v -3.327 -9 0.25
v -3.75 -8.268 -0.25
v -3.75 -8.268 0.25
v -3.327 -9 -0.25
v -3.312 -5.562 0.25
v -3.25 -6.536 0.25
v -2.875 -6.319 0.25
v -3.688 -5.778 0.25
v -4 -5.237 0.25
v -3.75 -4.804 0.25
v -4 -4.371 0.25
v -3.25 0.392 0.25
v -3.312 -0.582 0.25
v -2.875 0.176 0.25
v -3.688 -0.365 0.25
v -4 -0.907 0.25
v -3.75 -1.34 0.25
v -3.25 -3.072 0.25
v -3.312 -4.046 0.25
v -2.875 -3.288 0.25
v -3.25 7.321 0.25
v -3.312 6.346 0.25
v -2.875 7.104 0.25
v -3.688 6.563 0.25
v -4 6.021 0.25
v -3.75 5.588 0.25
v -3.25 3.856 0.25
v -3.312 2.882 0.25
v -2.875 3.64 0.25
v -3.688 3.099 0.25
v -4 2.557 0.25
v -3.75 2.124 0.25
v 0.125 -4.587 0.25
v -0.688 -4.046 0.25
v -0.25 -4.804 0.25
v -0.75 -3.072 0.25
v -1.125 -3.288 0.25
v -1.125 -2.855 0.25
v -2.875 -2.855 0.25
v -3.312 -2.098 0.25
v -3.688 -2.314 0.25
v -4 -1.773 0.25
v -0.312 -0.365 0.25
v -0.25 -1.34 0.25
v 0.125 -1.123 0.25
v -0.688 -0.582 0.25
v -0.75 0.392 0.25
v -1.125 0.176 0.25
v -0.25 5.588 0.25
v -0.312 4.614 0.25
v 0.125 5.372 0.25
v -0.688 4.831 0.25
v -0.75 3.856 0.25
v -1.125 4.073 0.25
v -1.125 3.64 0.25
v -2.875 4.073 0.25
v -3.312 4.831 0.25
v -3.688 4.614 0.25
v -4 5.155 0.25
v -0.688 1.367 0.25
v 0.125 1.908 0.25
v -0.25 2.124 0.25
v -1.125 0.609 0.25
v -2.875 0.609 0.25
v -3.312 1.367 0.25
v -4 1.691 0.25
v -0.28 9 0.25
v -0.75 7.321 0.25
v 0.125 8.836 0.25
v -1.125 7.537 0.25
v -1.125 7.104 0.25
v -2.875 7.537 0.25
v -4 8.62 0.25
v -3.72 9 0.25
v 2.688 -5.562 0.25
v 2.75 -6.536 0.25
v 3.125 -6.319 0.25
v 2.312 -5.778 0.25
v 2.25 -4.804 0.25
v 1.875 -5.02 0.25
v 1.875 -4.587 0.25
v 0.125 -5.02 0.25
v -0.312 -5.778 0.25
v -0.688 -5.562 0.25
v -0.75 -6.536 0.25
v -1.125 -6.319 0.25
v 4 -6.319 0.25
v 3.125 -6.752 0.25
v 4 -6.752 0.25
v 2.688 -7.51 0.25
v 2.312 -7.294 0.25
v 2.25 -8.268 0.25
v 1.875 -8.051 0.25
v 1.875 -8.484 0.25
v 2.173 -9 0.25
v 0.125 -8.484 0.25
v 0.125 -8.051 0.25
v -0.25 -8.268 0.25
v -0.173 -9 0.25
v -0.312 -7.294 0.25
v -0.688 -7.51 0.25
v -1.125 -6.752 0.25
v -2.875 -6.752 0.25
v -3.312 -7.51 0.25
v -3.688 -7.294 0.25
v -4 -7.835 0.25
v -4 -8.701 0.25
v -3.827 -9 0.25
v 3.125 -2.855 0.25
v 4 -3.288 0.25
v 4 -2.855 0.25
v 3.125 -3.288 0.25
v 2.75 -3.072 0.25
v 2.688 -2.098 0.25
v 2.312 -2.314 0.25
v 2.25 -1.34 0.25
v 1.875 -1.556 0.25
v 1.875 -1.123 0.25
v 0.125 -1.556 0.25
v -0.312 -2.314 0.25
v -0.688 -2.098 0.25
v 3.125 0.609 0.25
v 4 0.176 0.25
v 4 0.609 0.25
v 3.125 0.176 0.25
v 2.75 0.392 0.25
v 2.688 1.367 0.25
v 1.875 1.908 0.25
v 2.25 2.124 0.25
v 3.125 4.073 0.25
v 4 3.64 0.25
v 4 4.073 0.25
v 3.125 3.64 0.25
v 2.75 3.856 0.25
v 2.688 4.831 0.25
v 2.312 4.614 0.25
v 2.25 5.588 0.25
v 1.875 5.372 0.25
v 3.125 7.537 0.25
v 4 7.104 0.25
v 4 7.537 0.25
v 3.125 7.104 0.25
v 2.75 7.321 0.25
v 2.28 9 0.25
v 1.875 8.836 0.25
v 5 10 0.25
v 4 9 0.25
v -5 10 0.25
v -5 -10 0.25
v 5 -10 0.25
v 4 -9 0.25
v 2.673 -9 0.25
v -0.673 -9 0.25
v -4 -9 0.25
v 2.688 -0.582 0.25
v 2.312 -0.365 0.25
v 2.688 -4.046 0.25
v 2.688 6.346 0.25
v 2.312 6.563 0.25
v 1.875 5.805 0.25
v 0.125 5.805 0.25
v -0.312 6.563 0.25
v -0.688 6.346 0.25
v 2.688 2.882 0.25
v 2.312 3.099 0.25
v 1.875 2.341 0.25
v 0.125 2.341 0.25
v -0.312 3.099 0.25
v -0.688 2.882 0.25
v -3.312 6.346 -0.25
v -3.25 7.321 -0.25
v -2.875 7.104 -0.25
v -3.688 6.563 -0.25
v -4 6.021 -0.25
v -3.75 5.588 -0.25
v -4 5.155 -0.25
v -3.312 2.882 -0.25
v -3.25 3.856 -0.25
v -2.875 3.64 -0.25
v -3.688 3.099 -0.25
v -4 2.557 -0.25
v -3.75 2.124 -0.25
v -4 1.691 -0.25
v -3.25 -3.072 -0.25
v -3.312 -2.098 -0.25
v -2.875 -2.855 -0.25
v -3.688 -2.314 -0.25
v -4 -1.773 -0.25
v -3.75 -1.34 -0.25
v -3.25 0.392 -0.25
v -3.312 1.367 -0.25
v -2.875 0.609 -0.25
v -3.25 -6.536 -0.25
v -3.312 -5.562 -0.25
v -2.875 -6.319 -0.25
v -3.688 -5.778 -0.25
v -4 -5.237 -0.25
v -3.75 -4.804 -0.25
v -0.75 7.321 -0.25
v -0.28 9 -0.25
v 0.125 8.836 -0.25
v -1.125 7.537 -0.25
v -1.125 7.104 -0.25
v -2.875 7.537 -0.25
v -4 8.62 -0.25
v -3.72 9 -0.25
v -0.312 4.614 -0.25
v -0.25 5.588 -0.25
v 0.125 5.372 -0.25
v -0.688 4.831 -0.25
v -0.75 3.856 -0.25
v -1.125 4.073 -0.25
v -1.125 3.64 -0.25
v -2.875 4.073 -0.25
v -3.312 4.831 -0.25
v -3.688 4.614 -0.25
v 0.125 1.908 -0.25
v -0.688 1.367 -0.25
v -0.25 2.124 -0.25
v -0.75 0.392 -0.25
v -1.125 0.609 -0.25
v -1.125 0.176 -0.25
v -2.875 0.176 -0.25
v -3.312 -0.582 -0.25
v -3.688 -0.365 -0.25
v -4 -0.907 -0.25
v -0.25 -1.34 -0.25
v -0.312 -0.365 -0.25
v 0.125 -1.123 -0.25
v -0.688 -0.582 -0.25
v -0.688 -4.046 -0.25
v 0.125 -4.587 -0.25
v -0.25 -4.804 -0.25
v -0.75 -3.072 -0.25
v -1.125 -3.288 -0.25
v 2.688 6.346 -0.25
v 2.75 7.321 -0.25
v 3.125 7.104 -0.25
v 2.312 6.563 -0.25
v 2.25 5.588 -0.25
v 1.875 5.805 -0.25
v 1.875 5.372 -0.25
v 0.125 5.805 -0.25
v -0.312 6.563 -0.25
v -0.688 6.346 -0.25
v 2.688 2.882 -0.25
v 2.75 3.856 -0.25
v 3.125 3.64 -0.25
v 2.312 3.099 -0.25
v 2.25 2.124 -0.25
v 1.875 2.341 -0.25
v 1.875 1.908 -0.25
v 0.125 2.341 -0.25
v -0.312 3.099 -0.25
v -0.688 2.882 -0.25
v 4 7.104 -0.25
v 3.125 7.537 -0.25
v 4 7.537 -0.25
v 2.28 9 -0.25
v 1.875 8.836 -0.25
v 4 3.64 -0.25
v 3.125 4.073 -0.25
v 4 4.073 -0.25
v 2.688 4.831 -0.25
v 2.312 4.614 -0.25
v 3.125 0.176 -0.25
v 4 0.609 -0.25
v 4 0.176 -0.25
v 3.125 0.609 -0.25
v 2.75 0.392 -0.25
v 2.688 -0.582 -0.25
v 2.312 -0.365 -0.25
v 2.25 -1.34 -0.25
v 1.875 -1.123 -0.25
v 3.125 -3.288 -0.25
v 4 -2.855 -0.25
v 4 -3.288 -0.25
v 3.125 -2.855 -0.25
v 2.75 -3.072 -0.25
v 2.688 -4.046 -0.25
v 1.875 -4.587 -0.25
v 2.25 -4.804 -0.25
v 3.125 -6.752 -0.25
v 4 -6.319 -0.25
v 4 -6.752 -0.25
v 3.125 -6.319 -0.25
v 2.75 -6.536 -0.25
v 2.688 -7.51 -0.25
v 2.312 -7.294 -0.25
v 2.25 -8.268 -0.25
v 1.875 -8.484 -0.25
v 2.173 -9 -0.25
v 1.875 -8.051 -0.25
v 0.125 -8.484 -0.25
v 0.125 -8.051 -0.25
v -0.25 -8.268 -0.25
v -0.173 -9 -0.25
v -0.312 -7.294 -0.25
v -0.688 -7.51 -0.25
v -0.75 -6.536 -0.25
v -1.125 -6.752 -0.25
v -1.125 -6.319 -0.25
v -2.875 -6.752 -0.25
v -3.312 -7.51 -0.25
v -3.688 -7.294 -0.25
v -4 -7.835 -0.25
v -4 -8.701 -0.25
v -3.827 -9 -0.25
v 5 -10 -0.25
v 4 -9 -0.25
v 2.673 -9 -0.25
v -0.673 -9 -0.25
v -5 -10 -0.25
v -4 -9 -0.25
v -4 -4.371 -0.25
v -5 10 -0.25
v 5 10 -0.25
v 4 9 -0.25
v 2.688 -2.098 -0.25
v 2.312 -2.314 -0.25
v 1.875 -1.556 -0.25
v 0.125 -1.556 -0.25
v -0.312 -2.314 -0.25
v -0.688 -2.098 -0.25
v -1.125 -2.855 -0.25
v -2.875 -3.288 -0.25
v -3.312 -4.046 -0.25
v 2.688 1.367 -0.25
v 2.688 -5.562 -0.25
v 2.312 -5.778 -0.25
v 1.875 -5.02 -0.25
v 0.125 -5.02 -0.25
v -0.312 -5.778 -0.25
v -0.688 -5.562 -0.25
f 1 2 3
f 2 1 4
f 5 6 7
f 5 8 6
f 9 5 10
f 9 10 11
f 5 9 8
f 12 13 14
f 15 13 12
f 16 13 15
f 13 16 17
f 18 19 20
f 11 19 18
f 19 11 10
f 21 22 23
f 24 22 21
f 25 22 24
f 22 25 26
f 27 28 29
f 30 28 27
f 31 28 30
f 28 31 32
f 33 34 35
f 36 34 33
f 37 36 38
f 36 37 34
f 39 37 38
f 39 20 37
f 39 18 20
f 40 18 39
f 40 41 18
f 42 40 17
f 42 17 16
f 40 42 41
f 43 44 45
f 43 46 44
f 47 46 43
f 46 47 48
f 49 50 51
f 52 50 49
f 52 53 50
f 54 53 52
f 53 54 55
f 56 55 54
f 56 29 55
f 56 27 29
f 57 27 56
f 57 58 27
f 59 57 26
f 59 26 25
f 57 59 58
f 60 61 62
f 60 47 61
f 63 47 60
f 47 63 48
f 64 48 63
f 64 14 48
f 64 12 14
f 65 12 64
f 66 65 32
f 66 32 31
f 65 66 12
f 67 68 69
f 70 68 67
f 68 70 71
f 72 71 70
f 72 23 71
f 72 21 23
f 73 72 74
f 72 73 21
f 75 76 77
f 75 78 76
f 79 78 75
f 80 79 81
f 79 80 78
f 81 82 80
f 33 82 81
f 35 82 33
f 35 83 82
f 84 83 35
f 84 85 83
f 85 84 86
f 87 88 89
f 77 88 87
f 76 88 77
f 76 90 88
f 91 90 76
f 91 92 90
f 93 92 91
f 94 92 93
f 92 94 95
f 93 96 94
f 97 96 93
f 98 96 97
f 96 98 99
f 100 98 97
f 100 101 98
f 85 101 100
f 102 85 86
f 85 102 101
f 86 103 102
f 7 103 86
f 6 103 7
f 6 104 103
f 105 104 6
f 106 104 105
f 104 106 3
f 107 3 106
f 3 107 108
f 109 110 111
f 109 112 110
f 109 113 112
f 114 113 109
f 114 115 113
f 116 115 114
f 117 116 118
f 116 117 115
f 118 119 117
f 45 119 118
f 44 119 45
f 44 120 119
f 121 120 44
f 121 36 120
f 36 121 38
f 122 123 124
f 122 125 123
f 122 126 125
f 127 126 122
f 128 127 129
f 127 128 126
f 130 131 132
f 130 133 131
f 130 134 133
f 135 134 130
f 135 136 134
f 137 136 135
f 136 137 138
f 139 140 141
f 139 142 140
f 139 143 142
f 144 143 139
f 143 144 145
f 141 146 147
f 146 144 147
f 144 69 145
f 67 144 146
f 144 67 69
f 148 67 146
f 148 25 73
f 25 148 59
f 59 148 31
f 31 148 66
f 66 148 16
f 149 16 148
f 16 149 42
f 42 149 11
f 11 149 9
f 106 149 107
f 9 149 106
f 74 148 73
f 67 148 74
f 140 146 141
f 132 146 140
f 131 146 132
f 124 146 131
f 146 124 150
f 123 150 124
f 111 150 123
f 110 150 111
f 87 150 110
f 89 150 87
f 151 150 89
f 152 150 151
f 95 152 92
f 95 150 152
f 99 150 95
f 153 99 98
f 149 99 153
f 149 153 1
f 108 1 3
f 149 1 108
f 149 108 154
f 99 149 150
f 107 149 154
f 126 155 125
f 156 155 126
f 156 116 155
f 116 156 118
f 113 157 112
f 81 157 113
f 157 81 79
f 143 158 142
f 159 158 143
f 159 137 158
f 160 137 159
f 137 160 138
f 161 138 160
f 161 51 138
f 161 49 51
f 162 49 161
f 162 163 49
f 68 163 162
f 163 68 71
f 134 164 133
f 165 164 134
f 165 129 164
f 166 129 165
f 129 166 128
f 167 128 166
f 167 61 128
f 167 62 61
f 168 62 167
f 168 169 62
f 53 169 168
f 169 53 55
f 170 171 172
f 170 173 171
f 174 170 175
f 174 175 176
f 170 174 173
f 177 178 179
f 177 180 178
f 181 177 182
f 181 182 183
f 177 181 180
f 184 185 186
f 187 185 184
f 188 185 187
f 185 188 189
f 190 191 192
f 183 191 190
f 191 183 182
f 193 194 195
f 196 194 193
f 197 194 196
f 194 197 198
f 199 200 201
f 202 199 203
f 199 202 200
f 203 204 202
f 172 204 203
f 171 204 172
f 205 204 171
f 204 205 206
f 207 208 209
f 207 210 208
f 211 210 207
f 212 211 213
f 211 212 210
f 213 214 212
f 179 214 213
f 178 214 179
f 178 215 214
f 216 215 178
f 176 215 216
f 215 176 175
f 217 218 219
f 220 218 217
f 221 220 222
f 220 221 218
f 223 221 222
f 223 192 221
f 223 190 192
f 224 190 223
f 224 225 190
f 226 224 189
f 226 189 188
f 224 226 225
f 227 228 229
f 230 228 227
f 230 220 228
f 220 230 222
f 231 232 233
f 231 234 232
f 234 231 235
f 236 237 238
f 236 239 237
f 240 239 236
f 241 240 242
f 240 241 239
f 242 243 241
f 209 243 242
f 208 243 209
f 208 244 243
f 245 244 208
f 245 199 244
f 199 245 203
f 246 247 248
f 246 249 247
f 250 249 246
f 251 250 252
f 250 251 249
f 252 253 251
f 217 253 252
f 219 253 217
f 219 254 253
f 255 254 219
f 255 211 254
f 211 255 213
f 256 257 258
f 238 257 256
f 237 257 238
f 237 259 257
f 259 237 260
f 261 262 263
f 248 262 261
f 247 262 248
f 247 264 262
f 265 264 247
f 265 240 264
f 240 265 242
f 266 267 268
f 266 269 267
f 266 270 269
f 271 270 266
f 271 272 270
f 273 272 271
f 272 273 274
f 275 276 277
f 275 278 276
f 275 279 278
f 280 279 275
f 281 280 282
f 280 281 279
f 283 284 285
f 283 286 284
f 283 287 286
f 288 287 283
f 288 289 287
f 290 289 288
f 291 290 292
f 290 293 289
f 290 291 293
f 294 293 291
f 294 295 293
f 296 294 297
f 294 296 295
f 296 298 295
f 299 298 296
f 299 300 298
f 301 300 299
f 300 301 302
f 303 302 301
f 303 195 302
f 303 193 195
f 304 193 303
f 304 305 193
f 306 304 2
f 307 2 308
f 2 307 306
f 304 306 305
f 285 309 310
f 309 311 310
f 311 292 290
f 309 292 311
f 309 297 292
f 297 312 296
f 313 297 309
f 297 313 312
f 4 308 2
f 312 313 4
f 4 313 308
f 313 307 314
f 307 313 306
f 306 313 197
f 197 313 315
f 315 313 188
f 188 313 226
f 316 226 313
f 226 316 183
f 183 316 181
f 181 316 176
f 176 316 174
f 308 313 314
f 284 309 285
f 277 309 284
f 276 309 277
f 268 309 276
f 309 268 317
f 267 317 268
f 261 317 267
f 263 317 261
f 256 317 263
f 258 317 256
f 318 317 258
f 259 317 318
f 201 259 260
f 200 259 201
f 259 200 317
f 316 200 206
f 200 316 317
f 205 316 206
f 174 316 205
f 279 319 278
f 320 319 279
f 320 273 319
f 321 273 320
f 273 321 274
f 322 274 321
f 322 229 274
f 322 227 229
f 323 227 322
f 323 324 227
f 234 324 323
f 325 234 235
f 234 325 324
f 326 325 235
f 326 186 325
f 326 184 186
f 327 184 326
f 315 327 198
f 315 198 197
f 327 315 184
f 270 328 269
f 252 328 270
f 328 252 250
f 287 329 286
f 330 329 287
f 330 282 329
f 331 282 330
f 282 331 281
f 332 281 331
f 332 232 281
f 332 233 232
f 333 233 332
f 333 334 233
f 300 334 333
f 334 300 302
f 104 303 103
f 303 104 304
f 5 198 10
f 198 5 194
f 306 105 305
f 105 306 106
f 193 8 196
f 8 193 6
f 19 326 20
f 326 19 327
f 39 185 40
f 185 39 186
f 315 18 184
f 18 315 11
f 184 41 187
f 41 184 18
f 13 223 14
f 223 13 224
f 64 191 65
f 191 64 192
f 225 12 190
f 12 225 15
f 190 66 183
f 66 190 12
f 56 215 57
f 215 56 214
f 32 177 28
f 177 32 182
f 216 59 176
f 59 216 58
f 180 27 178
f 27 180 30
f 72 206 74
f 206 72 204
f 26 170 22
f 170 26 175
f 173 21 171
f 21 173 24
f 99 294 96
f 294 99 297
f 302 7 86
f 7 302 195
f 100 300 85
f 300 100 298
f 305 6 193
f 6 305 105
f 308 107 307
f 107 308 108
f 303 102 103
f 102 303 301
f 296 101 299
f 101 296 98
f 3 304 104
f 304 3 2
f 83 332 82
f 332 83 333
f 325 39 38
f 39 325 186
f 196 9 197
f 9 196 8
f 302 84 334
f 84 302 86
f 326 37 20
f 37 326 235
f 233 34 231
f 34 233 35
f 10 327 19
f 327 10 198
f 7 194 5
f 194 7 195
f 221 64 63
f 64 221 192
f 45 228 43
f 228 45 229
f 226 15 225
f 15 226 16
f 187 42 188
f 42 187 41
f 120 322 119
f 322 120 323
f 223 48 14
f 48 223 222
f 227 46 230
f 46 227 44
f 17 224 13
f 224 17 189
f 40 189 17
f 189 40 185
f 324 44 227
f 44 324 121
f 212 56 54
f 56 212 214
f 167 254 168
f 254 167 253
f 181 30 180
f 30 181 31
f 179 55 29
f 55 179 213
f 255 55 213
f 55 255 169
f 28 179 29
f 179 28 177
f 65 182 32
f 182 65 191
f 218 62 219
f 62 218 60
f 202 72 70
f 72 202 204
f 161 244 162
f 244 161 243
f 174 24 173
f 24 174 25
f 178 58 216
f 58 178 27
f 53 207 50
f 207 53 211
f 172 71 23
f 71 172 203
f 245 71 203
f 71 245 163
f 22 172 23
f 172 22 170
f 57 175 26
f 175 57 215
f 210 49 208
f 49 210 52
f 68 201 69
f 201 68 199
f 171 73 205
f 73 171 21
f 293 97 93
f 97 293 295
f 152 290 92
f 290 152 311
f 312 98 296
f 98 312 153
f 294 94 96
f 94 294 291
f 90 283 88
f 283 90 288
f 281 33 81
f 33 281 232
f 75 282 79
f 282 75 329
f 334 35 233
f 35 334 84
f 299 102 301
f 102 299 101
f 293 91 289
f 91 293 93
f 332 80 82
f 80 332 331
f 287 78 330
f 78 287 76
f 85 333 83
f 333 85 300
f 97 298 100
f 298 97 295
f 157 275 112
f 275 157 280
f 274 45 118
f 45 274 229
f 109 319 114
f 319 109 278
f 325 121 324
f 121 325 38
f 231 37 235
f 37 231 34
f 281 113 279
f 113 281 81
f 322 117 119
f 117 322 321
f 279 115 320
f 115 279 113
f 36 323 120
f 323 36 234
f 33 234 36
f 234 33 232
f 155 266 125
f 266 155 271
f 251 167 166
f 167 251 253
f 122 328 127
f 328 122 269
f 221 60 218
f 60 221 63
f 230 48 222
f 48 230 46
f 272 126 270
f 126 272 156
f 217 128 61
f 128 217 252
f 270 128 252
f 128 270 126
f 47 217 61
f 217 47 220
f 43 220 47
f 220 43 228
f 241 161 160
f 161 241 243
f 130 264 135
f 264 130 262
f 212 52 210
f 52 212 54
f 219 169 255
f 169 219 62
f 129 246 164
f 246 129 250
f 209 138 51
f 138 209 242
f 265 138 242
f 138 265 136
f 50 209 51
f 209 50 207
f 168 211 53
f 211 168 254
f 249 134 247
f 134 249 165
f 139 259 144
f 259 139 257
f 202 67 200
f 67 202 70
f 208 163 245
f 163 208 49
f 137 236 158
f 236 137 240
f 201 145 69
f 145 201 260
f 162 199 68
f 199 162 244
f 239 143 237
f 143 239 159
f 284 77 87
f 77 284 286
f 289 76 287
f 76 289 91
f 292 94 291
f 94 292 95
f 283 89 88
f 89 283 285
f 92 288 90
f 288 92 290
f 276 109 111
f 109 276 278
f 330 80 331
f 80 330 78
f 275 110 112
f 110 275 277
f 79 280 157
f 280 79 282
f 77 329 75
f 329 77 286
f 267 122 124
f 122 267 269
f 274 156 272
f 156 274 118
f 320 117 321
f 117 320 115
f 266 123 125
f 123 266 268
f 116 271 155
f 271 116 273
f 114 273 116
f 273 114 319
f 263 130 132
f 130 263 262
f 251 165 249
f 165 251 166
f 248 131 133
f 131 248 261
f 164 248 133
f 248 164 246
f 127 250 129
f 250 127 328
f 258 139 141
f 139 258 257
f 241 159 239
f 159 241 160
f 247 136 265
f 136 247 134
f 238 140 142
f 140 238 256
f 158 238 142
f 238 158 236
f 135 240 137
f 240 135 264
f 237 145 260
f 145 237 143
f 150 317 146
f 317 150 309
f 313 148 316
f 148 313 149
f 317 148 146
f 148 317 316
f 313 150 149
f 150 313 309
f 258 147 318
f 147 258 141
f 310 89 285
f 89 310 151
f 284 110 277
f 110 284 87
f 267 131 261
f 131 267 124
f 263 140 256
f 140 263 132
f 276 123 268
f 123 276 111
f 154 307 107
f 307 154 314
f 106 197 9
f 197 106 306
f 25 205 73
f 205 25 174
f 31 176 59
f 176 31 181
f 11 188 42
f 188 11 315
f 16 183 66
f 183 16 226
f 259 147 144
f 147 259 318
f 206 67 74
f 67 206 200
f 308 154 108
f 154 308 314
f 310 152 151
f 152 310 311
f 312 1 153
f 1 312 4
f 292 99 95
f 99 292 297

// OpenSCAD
// Customizable hex pattern
// Created by Kjell Kernen
// Date 22.9.2014

/*[Pattern Parameters]*/
// of the pattern in mm:
width=10;       // [10:100]

// of the pattern in mm:
lenght=20;      // [10:100]

// of the pattern in tens of mm:
height=5;       // [2:200]

// in tens of mm:
border_width=20;// [2:100]

// in mm:
hex_radius=2;   // [1:20]

// in tens of mm: 
hex_border_width=5; // [2:50]

/*[Hidden]*/

xborder=(border_width/10<width)?width-border_width/10:0;
yborder=(border_width/10<lenght)?lenght-border_width/10:0;

x=sqrt(3/4*hex_radius*hex_radius);
ystep=2*x;
xstep=3*hex_radius/2;

module hex(x,y)
{
	difference()
	{
		translate([x,y,-height/20]) 
			cylinder(r=(hex_radius+hex_border_width/20), h=height/10, $fn=6);	
		translate([x,y,-height/20]) 
			cylinder(r=(hex_radius-hex_border_width/20), h=height/10, $fn=6);
	}
}

//Pattern
intersection()
{
	for (xi=[0:xstep:width])
		for(yi=[0:ystep:lenght])
			hex(xi-width/2,((((xi/xstep)%2)==0)?0:ystep/2)+yi-lenght/2);
	translate([-width/2, -lenght/2, -height/20]) 
		cube([width,lenght,height/10]);
}

// Frame
difference()
{
	translate([-width/2, -lenght/2, -height/20]) 
		cube([width,lenght,height/10]);
	translate([-xborder/2, -yborder/2, -(height/20+0.1)]) 
		cube([xborder,yborder,height/10+0.2]); 
}
